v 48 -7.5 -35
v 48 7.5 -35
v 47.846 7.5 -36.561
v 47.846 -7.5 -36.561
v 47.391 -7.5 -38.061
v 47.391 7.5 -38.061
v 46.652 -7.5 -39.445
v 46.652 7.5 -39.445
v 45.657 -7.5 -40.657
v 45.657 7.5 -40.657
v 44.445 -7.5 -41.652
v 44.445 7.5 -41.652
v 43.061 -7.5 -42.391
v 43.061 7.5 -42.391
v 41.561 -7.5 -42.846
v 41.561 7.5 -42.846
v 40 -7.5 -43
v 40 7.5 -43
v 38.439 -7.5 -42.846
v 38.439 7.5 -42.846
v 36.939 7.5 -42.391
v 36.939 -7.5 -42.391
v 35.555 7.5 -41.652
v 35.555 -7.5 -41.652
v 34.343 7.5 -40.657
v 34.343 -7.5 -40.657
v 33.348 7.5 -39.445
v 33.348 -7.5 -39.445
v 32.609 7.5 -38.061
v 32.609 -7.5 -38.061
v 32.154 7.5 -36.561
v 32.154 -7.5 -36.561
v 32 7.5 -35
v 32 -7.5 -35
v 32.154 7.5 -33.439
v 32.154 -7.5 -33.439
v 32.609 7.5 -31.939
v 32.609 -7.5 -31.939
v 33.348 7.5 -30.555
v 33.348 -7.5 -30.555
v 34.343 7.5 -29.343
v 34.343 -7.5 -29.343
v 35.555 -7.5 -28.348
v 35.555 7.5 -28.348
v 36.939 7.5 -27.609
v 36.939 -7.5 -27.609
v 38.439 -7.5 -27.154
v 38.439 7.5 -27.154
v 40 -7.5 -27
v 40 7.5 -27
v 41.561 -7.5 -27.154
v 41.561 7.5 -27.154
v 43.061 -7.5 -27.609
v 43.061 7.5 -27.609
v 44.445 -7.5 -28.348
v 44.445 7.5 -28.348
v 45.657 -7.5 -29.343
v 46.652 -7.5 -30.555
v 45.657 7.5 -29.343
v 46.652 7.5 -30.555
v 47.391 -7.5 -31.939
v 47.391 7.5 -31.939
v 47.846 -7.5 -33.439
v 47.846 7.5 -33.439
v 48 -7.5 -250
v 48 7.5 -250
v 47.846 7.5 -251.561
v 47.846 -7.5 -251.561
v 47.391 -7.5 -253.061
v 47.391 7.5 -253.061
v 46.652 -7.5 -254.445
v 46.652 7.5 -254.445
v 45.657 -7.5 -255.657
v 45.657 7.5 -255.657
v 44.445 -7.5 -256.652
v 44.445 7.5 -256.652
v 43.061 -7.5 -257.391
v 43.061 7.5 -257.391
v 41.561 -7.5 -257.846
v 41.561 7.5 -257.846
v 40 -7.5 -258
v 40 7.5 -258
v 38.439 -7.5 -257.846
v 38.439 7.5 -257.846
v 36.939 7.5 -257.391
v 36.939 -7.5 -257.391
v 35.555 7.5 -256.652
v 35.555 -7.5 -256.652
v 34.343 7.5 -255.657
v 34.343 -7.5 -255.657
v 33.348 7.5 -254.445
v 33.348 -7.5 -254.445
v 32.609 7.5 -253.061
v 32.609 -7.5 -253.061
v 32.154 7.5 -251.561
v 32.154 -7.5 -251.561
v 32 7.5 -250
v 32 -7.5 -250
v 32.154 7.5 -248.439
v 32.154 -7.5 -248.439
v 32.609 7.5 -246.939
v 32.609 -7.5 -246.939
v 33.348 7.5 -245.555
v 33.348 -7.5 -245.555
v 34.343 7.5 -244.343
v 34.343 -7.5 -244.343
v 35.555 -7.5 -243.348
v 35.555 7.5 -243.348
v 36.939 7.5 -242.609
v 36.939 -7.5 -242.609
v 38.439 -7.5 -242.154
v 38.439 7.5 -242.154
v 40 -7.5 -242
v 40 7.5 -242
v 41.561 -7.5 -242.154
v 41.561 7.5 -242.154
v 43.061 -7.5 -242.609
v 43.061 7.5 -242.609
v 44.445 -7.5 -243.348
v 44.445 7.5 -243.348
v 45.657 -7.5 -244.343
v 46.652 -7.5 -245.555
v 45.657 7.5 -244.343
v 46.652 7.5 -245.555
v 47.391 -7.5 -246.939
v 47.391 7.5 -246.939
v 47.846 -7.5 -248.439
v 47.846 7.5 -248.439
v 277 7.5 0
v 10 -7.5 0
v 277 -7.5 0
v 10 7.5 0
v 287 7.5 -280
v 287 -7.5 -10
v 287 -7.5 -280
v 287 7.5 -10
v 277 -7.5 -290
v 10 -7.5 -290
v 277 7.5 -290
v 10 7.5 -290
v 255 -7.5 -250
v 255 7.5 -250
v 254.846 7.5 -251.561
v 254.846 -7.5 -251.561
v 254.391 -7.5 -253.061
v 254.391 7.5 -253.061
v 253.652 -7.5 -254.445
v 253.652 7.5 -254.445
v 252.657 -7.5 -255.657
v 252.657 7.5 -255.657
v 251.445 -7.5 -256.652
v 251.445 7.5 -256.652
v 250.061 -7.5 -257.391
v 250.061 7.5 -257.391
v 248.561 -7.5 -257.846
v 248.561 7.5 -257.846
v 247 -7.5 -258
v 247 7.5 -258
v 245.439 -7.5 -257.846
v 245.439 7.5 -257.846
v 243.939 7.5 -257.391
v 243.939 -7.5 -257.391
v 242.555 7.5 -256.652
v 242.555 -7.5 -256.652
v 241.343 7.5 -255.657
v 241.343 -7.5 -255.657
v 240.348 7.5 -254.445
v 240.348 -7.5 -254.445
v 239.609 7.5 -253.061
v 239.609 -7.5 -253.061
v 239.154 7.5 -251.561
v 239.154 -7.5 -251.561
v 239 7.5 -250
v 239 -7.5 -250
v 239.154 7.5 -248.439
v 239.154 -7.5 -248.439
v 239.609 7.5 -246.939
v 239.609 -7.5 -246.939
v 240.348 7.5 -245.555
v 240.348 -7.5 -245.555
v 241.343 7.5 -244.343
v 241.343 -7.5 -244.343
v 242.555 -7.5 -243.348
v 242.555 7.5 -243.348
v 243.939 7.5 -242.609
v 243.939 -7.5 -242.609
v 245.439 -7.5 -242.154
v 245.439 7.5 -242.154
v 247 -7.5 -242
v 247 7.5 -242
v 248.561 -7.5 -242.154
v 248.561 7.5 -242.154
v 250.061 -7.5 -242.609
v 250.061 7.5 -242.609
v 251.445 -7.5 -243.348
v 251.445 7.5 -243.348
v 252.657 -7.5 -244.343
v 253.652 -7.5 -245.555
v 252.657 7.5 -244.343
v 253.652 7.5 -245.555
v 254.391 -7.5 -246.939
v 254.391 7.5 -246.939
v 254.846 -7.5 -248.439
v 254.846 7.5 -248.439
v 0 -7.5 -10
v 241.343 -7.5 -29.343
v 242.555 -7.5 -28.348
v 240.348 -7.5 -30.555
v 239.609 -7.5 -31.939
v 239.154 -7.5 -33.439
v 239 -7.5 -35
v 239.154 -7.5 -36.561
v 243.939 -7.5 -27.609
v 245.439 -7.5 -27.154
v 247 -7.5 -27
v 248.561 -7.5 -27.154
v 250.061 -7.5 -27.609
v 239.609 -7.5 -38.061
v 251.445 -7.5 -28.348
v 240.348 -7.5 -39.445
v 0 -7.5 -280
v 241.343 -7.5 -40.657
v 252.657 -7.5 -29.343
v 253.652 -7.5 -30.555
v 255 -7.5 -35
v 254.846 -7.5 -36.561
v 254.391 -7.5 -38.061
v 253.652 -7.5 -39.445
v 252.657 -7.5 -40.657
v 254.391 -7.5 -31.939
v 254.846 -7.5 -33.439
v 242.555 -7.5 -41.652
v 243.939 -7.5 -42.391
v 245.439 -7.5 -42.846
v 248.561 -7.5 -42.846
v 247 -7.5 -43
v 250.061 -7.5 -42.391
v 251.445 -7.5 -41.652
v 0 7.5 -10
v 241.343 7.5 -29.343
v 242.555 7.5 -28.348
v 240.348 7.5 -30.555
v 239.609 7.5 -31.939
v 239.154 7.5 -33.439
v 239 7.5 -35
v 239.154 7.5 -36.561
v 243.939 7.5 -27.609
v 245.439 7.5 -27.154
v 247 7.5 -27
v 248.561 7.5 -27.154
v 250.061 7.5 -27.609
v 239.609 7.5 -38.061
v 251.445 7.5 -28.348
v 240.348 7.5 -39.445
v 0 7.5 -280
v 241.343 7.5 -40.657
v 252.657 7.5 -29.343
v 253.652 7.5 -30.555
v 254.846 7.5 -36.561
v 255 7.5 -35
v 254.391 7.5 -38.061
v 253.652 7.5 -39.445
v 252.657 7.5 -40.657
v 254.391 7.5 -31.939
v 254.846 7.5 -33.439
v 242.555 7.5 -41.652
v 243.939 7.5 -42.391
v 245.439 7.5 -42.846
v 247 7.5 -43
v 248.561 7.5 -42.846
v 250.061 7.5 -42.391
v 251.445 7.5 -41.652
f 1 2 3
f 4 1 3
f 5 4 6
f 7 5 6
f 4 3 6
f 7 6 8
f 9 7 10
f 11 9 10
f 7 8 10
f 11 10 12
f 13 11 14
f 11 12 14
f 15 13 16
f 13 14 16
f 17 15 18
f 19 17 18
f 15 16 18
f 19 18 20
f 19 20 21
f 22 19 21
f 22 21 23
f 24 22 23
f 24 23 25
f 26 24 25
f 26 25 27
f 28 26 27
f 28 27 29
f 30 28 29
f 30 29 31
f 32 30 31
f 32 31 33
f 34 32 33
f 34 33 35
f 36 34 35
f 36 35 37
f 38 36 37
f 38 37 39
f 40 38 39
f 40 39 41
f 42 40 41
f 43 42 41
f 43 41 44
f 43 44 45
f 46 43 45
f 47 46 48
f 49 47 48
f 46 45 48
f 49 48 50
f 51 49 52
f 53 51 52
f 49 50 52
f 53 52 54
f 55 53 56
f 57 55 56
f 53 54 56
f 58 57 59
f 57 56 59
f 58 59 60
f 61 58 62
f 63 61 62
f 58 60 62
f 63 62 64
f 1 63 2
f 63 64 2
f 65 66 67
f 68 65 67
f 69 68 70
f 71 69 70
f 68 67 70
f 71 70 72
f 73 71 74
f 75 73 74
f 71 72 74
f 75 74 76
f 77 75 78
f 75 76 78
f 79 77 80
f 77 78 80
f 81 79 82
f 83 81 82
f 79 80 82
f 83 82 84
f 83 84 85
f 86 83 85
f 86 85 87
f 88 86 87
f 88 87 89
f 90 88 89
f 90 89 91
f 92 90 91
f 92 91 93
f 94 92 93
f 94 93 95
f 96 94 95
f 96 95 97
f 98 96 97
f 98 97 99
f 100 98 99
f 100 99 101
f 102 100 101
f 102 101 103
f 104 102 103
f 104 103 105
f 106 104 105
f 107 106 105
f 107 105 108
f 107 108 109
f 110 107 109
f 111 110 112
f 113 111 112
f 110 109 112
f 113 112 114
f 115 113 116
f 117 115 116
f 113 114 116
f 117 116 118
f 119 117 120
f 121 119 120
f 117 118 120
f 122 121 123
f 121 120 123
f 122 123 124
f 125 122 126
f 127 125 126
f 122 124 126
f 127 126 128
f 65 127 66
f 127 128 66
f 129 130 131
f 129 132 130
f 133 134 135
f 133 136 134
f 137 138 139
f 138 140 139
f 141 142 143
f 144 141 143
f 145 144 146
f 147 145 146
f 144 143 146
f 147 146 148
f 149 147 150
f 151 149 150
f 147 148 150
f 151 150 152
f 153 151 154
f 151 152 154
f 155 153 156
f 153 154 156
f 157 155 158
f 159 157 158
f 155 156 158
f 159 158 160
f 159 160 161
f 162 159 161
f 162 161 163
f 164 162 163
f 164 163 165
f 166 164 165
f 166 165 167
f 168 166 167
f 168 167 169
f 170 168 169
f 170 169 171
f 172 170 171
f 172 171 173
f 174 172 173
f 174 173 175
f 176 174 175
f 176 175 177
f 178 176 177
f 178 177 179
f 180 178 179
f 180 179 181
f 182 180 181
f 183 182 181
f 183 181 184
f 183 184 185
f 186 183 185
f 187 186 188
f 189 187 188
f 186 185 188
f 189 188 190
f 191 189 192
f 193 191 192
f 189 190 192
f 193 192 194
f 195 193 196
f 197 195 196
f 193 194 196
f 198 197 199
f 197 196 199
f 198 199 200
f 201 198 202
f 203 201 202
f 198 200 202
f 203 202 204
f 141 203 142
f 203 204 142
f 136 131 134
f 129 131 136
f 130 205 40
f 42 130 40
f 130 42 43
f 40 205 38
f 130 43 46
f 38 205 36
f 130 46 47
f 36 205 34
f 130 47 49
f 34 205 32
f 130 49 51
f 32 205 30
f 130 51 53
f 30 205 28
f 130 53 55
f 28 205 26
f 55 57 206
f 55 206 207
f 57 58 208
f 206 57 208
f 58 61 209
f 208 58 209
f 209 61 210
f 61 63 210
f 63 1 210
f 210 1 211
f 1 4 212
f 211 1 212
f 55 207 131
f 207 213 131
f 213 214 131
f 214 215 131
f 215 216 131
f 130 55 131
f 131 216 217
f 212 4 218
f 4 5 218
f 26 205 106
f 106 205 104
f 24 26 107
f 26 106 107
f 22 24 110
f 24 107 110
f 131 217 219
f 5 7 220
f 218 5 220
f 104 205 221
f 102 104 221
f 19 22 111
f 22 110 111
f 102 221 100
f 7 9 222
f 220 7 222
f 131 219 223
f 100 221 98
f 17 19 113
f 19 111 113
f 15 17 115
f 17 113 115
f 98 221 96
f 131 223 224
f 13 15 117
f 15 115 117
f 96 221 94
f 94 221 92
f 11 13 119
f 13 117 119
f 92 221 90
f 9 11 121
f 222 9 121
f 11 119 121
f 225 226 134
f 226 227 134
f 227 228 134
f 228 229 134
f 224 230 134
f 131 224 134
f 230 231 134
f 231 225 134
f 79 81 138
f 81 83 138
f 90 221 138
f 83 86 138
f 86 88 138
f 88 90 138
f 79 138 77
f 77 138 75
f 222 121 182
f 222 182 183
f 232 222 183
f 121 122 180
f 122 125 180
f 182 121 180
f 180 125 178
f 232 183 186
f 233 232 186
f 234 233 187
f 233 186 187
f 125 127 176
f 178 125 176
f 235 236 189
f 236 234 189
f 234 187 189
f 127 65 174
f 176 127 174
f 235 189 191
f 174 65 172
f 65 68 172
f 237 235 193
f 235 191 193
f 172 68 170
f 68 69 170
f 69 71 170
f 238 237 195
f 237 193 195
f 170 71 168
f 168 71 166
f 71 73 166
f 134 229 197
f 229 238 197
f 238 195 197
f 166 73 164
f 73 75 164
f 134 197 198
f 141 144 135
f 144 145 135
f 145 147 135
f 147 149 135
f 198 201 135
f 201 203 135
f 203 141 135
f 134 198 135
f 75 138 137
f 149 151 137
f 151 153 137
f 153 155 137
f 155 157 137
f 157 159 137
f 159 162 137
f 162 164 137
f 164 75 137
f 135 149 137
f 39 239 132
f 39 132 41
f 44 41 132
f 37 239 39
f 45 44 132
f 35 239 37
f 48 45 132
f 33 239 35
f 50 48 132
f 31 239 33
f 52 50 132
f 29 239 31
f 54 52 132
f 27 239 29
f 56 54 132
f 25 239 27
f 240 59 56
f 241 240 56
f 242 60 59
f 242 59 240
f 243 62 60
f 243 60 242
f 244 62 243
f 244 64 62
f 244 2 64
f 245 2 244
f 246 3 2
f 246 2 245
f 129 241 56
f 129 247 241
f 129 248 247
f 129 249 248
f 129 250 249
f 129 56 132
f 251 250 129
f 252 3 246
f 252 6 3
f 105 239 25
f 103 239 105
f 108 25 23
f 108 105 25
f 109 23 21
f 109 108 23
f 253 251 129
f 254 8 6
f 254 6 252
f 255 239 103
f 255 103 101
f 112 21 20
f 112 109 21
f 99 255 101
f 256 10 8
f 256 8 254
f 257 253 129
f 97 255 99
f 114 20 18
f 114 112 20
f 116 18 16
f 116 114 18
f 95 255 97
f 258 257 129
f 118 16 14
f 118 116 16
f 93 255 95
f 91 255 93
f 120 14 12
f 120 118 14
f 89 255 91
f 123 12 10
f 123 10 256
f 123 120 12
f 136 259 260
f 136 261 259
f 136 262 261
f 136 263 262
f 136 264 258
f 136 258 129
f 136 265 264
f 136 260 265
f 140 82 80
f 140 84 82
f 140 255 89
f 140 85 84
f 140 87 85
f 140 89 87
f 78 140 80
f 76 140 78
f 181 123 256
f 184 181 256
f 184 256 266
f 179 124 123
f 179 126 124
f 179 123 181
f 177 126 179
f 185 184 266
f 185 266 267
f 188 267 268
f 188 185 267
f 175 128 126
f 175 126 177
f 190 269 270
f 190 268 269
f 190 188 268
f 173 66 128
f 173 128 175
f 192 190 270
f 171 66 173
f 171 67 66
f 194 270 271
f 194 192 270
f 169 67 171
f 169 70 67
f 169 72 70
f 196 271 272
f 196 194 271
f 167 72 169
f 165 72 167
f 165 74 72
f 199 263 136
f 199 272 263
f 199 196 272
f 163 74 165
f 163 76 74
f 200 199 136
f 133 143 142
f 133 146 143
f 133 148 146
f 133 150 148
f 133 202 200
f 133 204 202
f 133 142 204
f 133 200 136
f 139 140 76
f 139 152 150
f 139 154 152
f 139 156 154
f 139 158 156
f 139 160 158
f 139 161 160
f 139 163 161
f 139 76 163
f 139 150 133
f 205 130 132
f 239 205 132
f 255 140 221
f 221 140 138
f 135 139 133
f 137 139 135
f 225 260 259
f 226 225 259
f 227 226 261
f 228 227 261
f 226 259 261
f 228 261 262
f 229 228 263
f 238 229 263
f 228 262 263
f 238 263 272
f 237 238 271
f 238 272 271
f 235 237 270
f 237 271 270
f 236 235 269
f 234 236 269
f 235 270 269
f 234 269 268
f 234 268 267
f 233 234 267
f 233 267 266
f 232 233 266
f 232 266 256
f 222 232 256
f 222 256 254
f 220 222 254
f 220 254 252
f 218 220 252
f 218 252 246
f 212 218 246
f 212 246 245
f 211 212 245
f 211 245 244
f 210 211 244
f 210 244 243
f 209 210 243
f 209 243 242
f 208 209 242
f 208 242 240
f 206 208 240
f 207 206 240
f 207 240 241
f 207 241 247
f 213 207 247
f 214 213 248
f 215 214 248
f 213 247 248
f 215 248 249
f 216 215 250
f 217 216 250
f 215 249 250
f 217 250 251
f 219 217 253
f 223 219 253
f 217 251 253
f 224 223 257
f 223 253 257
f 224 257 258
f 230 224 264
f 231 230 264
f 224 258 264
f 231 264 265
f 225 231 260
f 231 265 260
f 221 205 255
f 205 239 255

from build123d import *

# Parameters (mm, degrees)
SKETCH1_W           = 287
SKETCH1_H           = 290
BOSS_EXTRUDE1_DEPTH = 7.5
CHAMFER1_SIZE       = 10
SKETCH3_R           = 8
CUT_EXTRUDE1_DEPTH  = 16


with BuildPart() as part:
    # Sketch1 → Boss-Extrude1 (new body, symmetric)
    with BuildSketch(Plane(origin=(0, 0, 0), x_dir=(1, 0, 0), z_dir=(0, 1, 0))):
        with Locations((143.5, 145)):
            Rectangle(SKETCH1_W, SKETCH1_H)
    extrude(amount=BOSS_EXTRUDE1_DEPTH, both=True)

    # Chamfer1
    chamfer1_edges = [part.edges().sort_by_distance(p)[0] for p in [
        (0, 0, -290),
        (287, 0, -290),
        (287, 0, 0),
        (0, 0, 0),
    ]]
    chamfer(chamfer1_edges, length=CHAMFER1_SIZE)

    # Sketch3 → Cut-Extrude1 (cut)
    with BuildSketch(Plane(origin=(0, 7.5, 0), x_dir=(1, 0, 0), z_dir=(0, 1, 0))):
        with Locations((40, 35)):
            Circle(SKETCH3_R)
        with Locations((40, 250)):
            Circle(SKETCH3_R)
        with Locations((247, 250)):
            Circle(SKETCH3_R)
        with Locations((247, 35)):
            Circle(SKETCH3_R)
    extrude(amount=-CUT_EXTRUDE1_DEPTH, mode=Mode.SUBTRACT)


solid = part.part
